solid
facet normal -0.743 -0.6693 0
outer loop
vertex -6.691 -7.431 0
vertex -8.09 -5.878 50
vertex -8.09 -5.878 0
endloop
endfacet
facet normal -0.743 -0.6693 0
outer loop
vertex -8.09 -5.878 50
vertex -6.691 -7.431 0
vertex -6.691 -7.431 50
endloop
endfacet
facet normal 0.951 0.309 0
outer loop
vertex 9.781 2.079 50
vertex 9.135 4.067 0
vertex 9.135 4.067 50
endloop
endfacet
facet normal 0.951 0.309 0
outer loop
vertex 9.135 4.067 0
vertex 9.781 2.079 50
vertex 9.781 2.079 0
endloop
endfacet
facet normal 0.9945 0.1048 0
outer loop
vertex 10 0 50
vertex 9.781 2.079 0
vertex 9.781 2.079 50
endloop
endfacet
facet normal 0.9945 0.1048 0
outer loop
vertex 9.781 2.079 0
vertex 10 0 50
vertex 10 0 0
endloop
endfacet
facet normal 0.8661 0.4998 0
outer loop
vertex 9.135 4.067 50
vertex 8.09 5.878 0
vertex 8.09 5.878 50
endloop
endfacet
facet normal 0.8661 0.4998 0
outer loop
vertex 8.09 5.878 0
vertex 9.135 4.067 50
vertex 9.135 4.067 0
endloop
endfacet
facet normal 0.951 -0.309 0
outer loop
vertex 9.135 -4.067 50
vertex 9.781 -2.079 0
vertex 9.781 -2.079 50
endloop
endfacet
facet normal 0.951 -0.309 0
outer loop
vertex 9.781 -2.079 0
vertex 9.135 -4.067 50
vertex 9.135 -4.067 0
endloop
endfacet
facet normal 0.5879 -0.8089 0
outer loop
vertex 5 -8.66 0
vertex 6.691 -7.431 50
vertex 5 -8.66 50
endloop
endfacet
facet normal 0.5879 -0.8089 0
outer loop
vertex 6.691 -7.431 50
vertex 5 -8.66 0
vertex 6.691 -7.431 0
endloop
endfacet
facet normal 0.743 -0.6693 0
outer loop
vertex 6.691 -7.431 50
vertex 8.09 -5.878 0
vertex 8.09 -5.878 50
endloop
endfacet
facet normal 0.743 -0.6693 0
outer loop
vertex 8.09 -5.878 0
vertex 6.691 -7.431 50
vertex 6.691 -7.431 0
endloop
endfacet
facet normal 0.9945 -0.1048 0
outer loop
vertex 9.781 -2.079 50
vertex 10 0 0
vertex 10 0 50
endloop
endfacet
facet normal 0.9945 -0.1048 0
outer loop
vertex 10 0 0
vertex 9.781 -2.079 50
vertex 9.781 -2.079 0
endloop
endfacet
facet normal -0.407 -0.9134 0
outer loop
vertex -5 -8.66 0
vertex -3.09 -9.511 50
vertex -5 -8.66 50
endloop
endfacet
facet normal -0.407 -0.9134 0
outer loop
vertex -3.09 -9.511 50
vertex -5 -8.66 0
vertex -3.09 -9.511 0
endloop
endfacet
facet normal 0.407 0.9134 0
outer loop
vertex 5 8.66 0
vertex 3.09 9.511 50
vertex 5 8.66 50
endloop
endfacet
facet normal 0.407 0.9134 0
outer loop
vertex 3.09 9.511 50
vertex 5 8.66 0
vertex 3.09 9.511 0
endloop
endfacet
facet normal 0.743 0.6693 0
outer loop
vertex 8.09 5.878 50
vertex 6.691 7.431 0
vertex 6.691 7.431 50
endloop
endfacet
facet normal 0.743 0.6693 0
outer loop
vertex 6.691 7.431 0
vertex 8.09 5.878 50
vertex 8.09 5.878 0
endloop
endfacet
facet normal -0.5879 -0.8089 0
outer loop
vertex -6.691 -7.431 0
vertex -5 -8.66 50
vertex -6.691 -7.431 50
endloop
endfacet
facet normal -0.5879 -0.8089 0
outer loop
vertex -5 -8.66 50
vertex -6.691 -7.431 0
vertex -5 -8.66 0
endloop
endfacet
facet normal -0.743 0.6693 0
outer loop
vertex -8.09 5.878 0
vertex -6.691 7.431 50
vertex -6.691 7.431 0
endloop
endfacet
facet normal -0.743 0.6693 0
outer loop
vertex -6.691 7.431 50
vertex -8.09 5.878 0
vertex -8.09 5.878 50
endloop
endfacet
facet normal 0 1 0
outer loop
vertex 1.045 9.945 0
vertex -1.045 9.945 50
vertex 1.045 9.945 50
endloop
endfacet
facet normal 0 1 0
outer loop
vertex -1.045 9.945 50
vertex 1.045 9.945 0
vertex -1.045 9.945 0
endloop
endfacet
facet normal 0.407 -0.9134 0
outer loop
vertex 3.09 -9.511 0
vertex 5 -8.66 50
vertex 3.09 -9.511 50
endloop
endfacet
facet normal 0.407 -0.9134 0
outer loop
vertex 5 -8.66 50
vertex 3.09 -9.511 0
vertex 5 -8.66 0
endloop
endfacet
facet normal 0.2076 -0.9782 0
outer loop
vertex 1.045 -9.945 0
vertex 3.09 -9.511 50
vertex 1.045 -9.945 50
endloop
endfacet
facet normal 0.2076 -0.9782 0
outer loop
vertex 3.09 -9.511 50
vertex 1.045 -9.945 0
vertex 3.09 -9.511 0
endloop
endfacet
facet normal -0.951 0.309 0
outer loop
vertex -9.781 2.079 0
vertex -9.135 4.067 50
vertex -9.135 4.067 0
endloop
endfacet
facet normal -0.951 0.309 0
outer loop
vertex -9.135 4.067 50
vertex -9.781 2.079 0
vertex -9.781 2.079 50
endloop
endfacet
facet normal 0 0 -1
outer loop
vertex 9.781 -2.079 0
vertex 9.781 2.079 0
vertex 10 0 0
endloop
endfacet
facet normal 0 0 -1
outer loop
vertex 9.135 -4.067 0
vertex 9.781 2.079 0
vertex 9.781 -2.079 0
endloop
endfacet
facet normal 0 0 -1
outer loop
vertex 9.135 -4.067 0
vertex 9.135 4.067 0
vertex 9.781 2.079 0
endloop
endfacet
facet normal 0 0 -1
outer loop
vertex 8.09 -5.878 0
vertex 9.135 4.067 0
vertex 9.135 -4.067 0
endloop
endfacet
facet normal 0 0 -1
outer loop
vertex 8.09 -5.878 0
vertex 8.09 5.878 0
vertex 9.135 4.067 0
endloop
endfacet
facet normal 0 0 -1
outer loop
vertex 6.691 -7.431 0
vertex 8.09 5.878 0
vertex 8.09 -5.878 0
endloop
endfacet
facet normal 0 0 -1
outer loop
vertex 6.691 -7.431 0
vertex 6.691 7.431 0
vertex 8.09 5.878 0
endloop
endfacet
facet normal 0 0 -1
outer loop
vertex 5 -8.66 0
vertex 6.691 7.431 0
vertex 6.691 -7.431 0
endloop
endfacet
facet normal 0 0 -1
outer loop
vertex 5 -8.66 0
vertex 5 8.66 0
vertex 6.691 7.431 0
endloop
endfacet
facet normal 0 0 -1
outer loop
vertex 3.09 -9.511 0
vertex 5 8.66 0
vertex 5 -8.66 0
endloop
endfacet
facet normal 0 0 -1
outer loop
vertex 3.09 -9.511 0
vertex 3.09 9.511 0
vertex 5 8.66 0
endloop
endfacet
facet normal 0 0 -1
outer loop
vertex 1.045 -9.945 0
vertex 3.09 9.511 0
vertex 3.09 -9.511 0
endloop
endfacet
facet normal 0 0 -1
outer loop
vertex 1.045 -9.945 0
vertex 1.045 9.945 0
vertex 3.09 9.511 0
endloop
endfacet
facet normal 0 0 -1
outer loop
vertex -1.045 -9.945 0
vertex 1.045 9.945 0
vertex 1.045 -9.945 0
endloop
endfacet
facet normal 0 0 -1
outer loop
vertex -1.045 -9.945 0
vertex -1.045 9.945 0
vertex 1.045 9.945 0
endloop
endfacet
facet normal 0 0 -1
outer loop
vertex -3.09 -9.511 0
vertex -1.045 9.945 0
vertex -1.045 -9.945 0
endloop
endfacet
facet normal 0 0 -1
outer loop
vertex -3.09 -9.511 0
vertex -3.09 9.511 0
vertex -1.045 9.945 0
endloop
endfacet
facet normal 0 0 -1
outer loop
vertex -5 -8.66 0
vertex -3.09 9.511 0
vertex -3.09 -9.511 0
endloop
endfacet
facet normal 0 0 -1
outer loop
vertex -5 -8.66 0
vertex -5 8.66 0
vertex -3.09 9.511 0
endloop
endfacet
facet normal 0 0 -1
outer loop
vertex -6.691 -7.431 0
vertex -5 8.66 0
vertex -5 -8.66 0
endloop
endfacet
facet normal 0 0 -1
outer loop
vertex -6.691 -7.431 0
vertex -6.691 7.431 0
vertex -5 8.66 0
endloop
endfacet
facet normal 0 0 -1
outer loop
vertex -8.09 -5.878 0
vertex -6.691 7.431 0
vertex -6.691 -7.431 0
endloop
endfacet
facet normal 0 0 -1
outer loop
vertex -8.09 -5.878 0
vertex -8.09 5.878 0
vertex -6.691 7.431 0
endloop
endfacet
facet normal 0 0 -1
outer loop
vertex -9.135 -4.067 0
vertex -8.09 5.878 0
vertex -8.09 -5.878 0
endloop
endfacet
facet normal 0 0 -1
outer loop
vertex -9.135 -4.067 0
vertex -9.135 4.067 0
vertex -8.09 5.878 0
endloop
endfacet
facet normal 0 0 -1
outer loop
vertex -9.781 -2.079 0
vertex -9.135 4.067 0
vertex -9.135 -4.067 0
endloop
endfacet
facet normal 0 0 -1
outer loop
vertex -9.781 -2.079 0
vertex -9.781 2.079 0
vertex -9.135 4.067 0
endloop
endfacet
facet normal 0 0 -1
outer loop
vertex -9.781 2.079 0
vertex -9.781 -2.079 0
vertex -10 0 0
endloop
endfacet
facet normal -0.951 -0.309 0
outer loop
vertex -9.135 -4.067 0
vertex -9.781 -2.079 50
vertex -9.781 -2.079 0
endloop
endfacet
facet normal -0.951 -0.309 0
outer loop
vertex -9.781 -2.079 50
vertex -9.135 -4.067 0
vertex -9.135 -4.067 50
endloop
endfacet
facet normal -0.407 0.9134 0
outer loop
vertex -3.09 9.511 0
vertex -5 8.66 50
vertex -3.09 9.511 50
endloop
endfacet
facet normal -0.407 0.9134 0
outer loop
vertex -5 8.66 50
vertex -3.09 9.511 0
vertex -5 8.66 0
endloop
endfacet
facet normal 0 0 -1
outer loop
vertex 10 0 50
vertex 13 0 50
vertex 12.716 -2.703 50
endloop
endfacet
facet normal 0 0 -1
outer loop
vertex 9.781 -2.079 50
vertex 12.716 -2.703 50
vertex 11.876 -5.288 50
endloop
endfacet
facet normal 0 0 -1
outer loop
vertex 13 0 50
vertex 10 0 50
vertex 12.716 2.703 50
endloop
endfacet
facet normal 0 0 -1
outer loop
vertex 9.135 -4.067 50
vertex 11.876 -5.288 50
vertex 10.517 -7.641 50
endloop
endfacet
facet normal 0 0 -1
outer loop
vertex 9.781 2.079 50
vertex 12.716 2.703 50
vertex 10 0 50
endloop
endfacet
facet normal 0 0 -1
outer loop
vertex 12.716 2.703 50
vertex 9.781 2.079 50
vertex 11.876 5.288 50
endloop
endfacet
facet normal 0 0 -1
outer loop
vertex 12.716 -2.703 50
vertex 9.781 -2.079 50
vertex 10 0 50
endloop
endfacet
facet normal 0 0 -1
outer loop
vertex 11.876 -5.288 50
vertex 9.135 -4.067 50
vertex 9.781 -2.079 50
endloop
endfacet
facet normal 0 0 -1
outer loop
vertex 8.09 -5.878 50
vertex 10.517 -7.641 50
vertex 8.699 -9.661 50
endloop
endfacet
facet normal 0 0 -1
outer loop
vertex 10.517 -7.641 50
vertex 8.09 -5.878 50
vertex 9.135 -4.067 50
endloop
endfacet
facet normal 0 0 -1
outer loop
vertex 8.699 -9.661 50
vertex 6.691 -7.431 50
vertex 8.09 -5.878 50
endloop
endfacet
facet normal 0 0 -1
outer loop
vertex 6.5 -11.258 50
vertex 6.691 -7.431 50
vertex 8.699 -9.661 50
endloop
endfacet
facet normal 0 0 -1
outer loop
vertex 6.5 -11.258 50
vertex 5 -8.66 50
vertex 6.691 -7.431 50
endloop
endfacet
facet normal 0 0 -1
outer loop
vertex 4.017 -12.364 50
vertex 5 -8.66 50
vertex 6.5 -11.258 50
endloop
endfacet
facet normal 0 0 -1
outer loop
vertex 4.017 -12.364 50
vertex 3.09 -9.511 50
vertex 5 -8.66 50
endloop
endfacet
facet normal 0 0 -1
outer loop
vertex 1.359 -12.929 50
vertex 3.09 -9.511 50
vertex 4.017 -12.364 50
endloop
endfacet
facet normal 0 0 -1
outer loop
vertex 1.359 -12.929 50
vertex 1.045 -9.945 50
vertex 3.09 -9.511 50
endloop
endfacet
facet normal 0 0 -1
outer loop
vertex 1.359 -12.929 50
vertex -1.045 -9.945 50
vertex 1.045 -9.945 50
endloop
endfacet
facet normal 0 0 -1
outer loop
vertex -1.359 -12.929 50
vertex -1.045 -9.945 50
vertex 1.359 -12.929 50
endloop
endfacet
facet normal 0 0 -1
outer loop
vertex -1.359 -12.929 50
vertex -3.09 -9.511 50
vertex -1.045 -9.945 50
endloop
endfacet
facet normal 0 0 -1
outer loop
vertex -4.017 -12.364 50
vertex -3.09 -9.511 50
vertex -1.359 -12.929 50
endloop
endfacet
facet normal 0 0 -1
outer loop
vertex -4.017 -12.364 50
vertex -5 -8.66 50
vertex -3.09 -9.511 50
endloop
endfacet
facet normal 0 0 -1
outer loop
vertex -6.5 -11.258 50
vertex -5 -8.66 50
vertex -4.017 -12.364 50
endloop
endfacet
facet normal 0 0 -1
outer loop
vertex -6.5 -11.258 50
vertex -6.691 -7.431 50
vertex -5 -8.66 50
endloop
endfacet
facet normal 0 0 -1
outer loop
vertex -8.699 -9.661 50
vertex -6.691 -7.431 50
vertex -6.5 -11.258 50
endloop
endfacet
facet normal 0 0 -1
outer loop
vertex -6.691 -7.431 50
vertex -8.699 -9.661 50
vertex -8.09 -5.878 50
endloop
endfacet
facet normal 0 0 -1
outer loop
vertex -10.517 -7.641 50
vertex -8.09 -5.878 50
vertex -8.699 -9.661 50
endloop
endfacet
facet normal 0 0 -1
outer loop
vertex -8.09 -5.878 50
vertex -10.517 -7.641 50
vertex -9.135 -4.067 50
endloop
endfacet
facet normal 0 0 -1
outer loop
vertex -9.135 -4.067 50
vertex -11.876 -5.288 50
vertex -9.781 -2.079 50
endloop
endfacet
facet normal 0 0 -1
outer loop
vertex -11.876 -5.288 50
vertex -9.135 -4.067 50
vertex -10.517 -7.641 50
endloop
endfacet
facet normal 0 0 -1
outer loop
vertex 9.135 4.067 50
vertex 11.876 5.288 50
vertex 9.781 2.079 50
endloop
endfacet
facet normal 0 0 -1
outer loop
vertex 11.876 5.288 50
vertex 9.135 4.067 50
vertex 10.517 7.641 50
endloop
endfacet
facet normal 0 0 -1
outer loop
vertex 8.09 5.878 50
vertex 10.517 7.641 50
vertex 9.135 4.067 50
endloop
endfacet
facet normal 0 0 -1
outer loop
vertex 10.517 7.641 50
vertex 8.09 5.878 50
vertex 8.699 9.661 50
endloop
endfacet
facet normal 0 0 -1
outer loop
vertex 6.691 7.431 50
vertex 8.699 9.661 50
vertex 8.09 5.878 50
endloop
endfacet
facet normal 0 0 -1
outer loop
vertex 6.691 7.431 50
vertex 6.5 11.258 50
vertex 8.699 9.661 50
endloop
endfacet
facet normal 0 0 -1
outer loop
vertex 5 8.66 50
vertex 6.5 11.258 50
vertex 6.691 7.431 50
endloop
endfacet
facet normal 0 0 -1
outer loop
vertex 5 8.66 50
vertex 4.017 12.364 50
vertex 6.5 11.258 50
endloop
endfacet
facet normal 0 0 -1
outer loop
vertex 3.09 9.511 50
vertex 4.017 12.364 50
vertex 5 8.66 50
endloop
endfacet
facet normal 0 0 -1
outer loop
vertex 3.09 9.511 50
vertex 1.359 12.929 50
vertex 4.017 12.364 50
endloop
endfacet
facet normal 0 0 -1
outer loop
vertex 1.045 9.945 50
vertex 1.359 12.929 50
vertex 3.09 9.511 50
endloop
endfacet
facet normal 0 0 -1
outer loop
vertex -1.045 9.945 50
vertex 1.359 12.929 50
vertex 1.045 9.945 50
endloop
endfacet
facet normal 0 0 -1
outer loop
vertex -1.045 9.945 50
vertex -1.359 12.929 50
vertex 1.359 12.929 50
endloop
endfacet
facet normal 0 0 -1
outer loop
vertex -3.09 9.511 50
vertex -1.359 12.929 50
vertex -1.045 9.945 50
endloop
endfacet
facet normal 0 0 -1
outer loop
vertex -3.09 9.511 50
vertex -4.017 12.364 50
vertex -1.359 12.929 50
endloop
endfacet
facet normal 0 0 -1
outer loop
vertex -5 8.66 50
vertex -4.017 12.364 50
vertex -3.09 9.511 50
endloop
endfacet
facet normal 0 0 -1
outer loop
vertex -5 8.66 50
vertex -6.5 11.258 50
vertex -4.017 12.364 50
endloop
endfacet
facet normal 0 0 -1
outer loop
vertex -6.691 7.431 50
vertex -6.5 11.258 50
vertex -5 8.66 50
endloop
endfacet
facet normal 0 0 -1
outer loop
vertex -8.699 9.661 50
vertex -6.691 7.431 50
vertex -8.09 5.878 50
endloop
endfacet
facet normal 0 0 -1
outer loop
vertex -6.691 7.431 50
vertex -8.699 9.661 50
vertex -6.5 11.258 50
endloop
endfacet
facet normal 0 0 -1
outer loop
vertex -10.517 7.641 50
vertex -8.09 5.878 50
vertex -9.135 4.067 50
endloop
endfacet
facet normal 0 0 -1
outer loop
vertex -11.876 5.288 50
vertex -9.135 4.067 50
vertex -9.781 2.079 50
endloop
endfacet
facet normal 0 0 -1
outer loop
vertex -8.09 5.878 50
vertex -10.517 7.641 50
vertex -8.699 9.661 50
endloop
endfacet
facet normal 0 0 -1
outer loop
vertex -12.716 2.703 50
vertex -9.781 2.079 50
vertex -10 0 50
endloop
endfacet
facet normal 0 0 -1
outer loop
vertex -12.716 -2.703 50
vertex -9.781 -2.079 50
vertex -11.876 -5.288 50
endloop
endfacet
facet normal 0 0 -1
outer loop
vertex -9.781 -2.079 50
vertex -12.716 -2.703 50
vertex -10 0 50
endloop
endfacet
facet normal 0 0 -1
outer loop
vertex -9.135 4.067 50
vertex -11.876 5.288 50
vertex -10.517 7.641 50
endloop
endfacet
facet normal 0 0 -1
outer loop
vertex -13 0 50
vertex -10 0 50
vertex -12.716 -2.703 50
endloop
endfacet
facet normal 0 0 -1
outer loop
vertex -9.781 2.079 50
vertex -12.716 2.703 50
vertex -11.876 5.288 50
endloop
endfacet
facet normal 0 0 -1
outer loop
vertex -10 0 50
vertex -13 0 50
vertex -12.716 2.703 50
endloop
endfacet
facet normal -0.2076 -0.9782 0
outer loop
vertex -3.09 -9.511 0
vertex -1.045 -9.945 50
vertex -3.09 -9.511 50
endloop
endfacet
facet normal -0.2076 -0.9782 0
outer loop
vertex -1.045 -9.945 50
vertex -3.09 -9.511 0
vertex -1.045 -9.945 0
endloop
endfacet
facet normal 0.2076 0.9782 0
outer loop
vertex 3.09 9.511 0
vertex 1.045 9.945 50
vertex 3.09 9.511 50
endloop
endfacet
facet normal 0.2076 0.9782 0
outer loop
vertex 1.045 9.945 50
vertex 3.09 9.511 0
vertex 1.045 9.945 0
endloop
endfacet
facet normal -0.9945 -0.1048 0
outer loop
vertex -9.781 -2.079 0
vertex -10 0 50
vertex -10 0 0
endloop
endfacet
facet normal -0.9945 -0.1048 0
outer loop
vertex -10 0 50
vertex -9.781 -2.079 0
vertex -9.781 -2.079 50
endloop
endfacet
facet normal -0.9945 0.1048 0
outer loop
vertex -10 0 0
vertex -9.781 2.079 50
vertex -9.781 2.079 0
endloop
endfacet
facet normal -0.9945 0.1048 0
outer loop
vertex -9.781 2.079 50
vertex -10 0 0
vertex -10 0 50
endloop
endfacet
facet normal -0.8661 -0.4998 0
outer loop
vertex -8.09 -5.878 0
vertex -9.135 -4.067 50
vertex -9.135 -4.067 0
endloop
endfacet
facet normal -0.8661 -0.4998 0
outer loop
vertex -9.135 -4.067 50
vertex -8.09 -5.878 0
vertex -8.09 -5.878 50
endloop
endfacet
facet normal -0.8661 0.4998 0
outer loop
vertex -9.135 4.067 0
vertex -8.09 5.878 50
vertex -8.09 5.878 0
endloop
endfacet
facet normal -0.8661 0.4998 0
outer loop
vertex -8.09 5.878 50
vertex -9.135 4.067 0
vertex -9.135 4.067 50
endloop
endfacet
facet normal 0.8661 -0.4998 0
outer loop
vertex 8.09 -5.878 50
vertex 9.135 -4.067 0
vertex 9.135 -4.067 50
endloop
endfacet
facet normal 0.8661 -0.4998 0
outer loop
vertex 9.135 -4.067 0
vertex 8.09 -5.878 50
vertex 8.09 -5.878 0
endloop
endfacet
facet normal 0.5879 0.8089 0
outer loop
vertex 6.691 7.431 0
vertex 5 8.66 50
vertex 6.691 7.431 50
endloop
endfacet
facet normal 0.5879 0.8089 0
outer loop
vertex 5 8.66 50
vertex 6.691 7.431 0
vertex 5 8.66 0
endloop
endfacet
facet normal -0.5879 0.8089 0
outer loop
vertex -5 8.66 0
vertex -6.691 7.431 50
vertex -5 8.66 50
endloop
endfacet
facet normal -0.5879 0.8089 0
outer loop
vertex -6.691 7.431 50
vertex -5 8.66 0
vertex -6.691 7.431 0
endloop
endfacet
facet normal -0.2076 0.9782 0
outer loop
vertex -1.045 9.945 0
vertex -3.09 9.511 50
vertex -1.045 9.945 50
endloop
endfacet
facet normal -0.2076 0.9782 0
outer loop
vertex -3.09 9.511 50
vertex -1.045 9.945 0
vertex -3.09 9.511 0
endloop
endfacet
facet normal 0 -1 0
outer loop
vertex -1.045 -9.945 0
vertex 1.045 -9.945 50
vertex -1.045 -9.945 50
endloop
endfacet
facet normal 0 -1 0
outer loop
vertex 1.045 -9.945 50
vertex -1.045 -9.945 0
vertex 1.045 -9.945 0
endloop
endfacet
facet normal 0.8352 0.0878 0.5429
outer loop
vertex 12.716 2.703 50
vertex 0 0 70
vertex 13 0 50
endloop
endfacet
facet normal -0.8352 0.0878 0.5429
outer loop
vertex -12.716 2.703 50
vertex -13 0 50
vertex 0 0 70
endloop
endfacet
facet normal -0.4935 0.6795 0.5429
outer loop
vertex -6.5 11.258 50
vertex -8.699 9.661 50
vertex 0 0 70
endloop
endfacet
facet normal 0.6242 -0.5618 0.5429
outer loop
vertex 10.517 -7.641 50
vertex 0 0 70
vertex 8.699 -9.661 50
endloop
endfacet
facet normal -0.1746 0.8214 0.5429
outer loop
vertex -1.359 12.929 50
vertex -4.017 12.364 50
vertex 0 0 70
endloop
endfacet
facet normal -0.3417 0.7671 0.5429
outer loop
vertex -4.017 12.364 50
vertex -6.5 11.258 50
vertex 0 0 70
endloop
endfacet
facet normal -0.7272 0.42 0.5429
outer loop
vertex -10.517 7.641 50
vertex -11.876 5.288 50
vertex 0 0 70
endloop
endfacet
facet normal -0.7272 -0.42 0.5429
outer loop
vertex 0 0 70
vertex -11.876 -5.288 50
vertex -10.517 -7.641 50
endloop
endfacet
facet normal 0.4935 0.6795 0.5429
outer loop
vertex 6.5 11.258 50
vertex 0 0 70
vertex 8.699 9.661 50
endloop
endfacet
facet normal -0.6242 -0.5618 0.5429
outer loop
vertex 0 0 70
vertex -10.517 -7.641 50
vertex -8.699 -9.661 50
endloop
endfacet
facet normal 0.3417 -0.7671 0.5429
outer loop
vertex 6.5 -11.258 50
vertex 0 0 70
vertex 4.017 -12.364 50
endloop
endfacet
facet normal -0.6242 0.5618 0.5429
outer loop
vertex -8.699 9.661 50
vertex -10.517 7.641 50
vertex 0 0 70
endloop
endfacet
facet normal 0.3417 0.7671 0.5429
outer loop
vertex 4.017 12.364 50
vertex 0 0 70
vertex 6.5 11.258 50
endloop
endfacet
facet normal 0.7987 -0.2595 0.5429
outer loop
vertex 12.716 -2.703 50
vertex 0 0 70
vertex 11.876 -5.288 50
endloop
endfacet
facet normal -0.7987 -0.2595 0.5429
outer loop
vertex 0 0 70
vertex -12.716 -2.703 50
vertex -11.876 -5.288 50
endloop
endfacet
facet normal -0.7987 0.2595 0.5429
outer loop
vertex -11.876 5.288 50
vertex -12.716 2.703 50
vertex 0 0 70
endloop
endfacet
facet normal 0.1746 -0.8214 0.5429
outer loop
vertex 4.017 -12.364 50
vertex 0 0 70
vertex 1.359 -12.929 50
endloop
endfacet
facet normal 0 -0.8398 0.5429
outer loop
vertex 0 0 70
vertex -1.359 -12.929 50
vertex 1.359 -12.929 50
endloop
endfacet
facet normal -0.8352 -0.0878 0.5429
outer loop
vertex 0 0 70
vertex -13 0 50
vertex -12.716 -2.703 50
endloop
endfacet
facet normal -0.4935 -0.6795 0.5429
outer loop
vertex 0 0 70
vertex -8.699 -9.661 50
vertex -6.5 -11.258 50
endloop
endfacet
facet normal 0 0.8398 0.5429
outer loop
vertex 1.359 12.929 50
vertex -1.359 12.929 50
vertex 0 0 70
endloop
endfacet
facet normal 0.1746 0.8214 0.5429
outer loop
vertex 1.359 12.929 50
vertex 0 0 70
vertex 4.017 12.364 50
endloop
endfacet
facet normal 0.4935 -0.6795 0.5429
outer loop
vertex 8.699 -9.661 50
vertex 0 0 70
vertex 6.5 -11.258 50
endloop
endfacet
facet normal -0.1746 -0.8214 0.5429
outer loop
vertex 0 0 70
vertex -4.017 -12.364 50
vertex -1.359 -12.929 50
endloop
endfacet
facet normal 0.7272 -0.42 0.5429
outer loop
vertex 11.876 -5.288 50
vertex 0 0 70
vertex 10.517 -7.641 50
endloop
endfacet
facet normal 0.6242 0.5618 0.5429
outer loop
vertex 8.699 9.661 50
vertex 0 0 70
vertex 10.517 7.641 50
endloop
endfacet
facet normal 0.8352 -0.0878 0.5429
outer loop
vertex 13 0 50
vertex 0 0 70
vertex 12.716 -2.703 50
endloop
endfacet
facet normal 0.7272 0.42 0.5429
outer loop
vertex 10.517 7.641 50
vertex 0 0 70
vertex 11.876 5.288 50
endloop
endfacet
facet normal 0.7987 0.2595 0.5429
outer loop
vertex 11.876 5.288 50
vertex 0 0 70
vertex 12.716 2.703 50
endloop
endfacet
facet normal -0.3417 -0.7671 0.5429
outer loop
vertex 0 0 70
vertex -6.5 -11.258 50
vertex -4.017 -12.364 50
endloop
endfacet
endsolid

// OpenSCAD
// Parameter
hoehe      = 50;  // Höhe des Turms
radius     = 10;  // Radius des Turms
dach_hoehe = 20;  // Höhe des Dachs
ueberstand = 3;   // So weit steht das Dach über

// Turm (grün)
color("#159989")
  cylinder(h = hoehe, r = radius);

// Dach: Kegel (gelb)
color("#F9B338")
  translate([0, 0, hoehe])
    cylinder(h = dach_hoehe, r1 = radius + ueberstand, r2 = 0);
